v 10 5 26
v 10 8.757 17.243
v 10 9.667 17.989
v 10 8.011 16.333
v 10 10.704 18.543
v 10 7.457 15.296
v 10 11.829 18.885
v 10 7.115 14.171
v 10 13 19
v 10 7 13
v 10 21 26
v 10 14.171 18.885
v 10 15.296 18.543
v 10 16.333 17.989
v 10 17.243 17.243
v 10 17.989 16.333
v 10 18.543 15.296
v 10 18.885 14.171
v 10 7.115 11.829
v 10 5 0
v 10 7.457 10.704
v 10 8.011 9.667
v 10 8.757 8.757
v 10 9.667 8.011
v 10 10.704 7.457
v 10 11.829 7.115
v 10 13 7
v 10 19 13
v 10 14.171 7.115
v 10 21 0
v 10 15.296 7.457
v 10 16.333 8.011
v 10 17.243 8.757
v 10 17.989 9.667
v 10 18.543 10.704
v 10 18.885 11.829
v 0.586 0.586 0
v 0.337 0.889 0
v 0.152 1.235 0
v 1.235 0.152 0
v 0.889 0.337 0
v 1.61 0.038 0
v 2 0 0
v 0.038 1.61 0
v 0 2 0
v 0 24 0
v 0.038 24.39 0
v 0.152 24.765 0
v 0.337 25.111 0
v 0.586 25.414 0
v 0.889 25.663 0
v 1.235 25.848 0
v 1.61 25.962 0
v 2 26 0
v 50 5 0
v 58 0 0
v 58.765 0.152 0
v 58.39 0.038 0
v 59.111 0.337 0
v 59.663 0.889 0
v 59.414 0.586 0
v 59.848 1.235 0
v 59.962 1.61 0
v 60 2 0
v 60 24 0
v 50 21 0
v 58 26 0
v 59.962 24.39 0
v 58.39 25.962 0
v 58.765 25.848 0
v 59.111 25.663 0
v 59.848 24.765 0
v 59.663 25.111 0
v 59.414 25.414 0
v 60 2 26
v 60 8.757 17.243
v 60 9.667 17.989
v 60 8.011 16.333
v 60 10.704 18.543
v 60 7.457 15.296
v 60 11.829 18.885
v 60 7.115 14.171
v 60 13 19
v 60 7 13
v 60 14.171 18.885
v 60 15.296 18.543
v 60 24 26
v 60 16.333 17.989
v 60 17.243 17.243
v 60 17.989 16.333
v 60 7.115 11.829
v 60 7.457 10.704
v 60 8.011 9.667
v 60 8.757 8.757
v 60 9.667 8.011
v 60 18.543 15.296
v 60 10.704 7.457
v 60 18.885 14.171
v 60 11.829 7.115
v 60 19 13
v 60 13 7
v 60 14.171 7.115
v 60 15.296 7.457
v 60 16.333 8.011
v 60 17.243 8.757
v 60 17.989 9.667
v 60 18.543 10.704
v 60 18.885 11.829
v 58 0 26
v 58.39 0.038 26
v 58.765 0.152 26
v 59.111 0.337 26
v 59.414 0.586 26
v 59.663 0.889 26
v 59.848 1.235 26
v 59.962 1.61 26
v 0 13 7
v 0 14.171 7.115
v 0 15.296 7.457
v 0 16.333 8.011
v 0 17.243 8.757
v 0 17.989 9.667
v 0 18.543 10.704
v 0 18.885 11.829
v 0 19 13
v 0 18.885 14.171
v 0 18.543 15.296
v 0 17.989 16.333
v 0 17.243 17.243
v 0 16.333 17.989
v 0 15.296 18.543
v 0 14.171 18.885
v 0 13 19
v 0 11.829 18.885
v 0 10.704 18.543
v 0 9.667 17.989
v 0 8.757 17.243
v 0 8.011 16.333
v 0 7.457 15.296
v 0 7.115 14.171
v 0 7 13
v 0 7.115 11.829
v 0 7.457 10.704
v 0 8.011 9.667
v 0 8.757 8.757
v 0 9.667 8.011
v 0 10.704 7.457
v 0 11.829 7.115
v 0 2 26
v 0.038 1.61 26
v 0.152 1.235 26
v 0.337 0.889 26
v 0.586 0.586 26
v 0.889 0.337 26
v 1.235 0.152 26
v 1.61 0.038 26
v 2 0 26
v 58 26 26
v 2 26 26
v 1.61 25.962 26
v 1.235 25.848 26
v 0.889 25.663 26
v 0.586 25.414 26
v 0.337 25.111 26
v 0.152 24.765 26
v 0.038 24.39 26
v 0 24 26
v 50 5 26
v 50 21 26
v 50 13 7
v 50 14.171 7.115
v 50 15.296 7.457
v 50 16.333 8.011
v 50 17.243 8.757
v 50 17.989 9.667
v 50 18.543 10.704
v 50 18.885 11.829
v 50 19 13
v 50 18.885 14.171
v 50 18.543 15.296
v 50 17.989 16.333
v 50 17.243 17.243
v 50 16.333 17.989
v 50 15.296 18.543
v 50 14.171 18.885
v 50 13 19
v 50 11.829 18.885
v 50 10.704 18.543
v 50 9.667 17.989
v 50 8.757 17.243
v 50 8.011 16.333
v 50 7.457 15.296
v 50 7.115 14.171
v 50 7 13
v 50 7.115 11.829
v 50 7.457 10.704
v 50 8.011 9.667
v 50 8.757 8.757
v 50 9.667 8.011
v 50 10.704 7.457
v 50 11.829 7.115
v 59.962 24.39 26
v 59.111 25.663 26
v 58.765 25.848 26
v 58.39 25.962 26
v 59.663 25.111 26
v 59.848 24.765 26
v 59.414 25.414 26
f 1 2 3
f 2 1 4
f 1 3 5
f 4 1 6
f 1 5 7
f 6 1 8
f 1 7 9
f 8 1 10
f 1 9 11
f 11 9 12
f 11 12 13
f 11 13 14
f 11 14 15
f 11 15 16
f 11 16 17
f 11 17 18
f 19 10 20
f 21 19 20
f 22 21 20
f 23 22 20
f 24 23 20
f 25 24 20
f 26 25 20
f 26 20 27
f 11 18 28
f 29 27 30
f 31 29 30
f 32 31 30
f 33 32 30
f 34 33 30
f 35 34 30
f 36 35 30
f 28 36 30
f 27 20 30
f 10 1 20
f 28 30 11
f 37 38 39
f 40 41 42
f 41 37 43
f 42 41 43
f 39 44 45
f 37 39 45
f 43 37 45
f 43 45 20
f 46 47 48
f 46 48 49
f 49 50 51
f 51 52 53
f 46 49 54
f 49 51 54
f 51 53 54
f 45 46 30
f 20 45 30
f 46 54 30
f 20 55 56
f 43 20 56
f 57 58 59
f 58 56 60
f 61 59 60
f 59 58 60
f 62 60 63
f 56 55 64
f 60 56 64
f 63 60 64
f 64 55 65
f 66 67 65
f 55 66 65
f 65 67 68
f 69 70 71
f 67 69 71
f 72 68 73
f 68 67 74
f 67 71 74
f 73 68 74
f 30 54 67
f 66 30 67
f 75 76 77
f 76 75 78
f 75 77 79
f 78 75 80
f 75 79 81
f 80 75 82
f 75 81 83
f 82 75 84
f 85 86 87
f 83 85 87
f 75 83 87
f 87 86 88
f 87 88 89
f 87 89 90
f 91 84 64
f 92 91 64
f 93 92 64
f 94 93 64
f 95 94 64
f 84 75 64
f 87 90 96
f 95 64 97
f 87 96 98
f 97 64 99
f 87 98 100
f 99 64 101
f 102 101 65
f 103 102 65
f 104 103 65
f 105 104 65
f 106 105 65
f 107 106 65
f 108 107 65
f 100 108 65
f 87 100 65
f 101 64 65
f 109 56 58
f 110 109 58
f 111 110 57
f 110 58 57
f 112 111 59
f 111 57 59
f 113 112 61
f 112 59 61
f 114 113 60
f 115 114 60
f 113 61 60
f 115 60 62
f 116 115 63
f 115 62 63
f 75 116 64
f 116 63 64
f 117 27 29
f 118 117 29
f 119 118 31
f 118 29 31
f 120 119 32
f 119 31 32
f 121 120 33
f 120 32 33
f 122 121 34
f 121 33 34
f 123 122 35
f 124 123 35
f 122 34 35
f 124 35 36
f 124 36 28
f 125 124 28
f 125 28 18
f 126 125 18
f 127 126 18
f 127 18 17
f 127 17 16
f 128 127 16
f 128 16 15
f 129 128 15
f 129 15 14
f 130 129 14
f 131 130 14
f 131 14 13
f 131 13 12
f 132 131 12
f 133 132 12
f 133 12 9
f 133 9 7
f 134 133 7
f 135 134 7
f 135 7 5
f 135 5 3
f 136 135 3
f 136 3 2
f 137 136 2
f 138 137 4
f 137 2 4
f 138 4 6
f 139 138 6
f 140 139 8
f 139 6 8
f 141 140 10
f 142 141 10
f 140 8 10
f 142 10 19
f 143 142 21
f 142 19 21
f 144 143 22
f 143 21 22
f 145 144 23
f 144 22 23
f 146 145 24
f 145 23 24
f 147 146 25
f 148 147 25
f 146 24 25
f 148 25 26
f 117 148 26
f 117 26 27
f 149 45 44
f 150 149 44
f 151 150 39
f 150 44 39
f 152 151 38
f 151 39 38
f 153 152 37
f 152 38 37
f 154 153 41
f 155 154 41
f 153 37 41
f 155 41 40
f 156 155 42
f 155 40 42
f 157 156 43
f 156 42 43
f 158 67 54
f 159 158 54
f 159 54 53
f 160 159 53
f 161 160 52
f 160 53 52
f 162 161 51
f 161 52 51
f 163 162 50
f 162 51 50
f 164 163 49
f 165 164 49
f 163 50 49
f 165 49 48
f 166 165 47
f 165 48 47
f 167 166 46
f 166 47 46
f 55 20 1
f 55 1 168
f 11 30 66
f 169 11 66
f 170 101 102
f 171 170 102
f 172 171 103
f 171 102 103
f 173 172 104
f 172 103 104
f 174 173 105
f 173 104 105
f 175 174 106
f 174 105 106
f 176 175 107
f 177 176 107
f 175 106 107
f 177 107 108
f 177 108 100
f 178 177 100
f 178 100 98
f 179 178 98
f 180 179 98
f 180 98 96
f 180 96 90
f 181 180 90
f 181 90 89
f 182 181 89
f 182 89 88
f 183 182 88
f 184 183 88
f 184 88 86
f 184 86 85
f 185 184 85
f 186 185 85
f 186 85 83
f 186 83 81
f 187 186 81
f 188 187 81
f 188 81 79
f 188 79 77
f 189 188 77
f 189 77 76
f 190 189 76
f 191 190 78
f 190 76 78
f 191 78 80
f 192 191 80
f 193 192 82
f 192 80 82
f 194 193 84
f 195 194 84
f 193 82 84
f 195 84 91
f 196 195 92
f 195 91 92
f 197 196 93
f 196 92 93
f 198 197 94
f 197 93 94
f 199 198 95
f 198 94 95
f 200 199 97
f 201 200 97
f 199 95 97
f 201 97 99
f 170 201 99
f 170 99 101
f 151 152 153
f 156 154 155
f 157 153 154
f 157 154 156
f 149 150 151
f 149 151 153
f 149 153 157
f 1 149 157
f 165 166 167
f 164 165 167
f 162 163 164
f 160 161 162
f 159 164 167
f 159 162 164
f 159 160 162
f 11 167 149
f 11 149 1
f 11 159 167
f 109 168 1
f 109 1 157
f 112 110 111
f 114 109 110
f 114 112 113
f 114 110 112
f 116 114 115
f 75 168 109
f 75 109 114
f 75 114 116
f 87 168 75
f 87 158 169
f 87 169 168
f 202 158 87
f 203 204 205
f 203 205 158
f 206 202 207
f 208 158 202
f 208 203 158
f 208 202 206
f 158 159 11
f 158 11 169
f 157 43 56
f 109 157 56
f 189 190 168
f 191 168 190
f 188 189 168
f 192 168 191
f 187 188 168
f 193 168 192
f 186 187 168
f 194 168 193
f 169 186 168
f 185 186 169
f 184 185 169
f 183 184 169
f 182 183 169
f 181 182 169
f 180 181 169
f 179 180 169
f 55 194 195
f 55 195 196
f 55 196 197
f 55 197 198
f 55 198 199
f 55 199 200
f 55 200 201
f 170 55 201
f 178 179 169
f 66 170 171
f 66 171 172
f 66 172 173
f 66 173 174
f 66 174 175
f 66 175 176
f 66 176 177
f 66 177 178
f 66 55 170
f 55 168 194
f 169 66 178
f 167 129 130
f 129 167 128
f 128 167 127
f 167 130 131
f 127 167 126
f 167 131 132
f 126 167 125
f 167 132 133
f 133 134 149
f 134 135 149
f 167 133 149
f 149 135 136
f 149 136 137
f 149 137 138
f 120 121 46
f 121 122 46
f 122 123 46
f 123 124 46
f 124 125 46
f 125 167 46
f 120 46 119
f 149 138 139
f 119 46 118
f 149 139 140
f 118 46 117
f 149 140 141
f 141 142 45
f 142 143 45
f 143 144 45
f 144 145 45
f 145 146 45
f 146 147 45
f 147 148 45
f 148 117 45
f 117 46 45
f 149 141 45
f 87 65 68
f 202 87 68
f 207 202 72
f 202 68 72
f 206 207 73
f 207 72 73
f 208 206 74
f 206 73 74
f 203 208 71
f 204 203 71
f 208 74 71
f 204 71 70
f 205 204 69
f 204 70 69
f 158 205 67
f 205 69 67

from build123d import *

# Parameters (mm, degrees)
SKETCH1_W           = 40
SKETCH1_H           = 16
BOSS_EXTRUDE1_DEPTH = 26
SKETCH6_R           = 6
CUT_EXTRUDE1_DEPTH  = 61


with BuildPart() as part:
    # Sketch1 → Boss-Extrude1 (new body)
    with BuildSketch(Plane.XY):
        with BuildLine():
            Line((2, 0), (58, 0))
            ThreePointArc((58, 0), (59.414213562, 0.585786438), (60, 2))
            Line((60, 2), (60, 24))
            ThreePointArc((60, 24), (59.414213562, 25.414213562), (58, 26))
            Line((58, 26), (2, 26))
            ThreePointArc((2, 26), (0.585786438, 25.414213562), (0, 24))
            Line((0, 24), (0, 2))
            ThreePointArc((0, 2), (0.585786438, 0.585786438), (2, 0))
        make_face()
        with Locations((30, 13)):
            Rectangle(SKETCH1_W, SKETCH1_H, mode=Mode.SUBTRACT)
    extrude(amount=BOSS_EXTRUDE1_DEPTH)

    # Sketch6 → Cut-Extrude1 (cut, through all)
    with BuildSketch(Plane(origin=(60, 0, 0), x_dir=(0, 0, -1), z_dir=(1, 0, 0))):
        with Locations((-13, 13)):
            Circle(SKETCH6_R)
    extrude(amount=-CUT_EXTRUDE1_DEPTH, mode=Mode.SUBTRACT)


solid = part.part
